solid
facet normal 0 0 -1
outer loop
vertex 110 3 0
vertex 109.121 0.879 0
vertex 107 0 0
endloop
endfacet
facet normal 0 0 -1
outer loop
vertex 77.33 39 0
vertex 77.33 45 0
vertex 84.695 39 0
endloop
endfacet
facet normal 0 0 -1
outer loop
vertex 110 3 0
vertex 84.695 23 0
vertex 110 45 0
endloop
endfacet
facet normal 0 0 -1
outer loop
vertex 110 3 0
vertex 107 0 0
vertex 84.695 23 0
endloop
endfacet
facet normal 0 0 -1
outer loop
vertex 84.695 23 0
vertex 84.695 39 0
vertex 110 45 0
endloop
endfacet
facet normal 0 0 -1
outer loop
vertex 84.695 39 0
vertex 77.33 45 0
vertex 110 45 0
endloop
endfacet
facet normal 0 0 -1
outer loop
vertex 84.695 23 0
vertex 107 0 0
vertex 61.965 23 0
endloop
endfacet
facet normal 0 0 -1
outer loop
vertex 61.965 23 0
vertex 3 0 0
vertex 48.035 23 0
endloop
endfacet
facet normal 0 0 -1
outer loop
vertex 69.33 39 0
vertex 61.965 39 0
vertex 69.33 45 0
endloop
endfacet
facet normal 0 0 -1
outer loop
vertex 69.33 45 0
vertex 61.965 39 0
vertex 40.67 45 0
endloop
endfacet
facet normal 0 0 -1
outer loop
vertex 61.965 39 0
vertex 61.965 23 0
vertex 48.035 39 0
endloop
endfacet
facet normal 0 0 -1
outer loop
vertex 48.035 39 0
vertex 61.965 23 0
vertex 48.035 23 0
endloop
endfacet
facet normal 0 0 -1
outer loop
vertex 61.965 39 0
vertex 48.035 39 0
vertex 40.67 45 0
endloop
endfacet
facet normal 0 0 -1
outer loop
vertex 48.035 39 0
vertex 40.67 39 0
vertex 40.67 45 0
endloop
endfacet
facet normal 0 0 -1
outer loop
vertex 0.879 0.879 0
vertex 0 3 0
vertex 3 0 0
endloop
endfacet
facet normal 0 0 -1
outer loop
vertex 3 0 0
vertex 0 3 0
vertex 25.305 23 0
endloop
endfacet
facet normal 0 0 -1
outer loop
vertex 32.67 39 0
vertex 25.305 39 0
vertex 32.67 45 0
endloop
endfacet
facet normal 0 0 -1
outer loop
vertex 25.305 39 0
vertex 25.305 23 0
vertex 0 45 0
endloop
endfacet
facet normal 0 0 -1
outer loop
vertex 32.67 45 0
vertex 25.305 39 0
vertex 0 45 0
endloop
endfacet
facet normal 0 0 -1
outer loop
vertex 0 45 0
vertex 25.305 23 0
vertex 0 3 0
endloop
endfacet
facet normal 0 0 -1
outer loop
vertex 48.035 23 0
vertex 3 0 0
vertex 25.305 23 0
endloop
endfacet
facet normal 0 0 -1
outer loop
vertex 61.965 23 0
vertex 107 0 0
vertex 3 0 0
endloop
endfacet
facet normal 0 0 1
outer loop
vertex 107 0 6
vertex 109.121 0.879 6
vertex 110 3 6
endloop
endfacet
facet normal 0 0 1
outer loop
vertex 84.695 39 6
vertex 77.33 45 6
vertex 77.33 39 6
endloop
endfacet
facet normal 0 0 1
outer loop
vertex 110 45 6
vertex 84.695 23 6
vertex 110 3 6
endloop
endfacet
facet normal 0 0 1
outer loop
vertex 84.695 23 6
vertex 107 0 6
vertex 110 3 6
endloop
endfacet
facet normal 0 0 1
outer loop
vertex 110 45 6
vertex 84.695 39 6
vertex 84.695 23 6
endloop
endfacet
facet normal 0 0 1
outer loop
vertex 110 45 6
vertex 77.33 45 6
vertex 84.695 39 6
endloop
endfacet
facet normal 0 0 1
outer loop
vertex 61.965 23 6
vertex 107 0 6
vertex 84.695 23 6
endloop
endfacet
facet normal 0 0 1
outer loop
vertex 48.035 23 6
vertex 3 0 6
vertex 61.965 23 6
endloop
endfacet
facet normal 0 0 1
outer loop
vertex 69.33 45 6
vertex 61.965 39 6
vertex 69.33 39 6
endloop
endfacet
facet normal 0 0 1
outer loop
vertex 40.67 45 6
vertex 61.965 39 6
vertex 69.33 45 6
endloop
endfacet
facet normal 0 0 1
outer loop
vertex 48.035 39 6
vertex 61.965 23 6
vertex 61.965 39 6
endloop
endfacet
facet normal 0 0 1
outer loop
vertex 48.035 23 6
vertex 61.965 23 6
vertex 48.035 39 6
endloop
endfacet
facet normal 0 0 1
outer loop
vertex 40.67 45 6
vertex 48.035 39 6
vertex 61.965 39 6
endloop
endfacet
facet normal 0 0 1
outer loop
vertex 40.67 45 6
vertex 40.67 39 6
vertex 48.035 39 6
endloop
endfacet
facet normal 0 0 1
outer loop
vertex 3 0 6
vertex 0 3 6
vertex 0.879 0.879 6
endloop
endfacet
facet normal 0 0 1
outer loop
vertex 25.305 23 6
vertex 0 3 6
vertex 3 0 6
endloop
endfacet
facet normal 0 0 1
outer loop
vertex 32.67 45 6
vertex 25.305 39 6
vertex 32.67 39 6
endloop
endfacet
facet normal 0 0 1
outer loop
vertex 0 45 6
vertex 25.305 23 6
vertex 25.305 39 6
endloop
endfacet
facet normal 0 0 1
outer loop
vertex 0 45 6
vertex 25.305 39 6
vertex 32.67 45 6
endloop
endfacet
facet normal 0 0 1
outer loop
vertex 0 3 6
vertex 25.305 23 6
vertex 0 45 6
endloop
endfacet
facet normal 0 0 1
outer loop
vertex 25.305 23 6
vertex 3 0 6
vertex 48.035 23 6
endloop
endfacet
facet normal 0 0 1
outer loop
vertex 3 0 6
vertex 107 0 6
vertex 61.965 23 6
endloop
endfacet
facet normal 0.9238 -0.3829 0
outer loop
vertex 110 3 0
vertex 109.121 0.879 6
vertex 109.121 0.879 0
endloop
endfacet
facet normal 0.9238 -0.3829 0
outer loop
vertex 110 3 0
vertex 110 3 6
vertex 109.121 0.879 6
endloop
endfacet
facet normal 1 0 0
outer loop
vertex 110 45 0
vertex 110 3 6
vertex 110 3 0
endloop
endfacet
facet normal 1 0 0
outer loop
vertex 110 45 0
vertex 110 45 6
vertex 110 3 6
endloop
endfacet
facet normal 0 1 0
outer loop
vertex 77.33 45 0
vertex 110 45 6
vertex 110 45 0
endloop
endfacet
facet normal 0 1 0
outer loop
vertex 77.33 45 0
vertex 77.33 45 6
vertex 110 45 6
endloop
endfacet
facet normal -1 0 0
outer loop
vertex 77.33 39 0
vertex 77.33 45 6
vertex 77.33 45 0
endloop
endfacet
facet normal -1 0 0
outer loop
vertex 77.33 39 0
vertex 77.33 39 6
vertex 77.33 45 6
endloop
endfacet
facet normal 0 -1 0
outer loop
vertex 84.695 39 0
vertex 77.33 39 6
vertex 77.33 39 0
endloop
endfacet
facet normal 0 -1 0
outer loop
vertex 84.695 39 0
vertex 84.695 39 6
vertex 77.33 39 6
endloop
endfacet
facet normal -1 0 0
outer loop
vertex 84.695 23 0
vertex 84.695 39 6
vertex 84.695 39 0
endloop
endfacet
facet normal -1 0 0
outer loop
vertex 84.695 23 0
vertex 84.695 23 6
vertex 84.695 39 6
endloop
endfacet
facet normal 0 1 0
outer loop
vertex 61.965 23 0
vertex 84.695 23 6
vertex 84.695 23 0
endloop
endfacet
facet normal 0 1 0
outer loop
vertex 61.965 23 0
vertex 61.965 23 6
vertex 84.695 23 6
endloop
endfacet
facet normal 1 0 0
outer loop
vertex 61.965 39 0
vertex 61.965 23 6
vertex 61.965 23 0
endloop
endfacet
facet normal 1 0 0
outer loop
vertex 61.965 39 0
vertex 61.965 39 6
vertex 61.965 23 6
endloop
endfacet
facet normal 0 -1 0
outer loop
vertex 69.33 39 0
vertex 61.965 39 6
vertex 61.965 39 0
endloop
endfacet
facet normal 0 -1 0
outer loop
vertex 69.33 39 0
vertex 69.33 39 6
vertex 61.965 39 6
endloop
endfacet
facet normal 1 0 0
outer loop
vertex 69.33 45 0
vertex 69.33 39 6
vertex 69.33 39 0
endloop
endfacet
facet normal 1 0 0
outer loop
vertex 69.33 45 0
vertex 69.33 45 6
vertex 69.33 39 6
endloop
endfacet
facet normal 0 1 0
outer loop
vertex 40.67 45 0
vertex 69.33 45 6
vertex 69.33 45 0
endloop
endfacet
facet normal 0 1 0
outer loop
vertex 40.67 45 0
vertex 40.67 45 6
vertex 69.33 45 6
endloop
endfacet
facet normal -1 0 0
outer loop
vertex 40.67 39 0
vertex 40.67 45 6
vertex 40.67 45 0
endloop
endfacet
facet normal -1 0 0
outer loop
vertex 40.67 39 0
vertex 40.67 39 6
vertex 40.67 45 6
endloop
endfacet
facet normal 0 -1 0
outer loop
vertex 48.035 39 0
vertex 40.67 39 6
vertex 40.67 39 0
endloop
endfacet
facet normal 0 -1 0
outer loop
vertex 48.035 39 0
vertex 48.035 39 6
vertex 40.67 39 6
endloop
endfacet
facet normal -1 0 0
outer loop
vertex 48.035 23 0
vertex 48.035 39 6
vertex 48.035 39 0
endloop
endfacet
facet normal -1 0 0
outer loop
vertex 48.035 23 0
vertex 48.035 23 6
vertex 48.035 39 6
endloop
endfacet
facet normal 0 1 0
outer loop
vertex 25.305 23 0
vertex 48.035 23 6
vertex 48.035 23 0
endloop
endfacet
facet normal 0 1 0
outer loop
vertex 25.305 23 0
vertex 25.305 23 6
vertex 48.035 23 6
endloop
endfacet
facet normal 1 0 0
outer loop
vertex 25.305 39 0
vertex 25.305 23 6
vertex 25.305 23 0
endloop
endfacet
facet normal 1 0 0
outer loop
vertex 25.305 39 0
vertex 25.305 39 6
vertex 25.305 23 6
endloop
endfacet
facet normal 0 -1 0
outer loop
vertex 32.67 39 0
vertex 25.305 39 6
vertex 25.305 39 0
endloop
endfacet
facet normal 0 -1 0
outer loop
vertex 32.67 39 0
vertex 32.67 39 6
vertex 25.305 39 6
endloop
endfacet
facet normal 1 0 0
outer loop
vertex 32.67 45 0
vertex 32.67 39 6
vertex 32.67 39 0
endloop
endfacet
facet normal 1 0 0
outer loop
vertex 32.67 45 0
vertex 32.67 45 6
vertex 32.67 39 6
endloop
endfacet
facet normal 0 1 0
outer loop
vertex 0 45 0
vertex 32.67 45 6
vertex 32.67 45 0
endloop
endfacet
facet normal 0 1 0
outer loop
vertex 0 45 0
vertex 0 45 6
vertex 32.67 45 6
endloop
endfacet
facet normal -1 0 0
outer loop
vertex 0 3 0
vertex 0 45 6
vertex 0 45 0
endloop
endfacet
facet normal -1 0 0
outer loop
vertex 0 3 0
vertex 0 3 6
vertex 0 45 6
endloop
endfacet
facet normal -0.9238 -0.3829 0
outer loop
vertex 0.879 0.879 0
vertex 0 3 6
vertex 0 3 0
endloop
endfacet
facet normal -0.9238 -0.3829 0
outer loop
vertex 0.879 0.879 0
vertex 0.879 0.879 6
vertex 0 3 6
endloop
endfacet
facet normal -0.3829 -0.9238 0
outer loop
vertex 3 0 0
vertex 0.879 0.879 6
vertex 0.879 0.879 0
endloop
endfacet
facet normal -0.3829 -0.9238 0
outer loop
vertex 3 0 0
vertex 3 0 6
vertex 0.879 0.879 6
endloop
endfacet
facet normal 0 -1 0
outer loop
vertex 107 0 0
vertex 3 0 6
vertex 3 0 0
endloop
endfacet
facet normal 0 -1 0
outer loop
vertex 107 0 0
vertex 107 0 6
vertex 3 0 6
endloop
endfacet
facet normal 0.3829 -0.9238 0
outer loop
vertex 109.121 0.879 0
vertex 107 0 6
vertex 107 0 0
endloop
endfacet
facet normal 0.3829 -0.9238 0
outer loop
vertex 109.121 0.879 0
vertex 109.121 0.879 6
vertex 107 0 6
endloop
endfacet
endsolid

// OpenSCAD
$fn = 32;

// ----------------------------------------------------------------------
// Window plate: 110 x 45 mm, 2 open windows
// ----------------------------------------------------------------------

// --- parameters (mm) ---
profile_height = 6;       // extrusion height
profile_points = 24;      // points of the closed outline

profile = [[0, 3], [0.879, 0.879], [3, 0], [107, 0], [109.121, 0.879], [110, 3], [110, 45], [77.33, 45], [77.33, 39], [84.695, 39], [84.695, 23], [61.965, 23], [61.965, 39], [69.33, 39], [69.33, 45], [40.67, 45], [40.67, 39], [48.035, 39], [48.035, 23], [25.305, 23], [25.305, 39], [32.67, 39], [32.67, 45], [0, 45]];  // single closed polygon, 24 points, counter clockwise

// --- the one profile operation ---
linear_extrude(height = profile_height) polygon(points = profile);
